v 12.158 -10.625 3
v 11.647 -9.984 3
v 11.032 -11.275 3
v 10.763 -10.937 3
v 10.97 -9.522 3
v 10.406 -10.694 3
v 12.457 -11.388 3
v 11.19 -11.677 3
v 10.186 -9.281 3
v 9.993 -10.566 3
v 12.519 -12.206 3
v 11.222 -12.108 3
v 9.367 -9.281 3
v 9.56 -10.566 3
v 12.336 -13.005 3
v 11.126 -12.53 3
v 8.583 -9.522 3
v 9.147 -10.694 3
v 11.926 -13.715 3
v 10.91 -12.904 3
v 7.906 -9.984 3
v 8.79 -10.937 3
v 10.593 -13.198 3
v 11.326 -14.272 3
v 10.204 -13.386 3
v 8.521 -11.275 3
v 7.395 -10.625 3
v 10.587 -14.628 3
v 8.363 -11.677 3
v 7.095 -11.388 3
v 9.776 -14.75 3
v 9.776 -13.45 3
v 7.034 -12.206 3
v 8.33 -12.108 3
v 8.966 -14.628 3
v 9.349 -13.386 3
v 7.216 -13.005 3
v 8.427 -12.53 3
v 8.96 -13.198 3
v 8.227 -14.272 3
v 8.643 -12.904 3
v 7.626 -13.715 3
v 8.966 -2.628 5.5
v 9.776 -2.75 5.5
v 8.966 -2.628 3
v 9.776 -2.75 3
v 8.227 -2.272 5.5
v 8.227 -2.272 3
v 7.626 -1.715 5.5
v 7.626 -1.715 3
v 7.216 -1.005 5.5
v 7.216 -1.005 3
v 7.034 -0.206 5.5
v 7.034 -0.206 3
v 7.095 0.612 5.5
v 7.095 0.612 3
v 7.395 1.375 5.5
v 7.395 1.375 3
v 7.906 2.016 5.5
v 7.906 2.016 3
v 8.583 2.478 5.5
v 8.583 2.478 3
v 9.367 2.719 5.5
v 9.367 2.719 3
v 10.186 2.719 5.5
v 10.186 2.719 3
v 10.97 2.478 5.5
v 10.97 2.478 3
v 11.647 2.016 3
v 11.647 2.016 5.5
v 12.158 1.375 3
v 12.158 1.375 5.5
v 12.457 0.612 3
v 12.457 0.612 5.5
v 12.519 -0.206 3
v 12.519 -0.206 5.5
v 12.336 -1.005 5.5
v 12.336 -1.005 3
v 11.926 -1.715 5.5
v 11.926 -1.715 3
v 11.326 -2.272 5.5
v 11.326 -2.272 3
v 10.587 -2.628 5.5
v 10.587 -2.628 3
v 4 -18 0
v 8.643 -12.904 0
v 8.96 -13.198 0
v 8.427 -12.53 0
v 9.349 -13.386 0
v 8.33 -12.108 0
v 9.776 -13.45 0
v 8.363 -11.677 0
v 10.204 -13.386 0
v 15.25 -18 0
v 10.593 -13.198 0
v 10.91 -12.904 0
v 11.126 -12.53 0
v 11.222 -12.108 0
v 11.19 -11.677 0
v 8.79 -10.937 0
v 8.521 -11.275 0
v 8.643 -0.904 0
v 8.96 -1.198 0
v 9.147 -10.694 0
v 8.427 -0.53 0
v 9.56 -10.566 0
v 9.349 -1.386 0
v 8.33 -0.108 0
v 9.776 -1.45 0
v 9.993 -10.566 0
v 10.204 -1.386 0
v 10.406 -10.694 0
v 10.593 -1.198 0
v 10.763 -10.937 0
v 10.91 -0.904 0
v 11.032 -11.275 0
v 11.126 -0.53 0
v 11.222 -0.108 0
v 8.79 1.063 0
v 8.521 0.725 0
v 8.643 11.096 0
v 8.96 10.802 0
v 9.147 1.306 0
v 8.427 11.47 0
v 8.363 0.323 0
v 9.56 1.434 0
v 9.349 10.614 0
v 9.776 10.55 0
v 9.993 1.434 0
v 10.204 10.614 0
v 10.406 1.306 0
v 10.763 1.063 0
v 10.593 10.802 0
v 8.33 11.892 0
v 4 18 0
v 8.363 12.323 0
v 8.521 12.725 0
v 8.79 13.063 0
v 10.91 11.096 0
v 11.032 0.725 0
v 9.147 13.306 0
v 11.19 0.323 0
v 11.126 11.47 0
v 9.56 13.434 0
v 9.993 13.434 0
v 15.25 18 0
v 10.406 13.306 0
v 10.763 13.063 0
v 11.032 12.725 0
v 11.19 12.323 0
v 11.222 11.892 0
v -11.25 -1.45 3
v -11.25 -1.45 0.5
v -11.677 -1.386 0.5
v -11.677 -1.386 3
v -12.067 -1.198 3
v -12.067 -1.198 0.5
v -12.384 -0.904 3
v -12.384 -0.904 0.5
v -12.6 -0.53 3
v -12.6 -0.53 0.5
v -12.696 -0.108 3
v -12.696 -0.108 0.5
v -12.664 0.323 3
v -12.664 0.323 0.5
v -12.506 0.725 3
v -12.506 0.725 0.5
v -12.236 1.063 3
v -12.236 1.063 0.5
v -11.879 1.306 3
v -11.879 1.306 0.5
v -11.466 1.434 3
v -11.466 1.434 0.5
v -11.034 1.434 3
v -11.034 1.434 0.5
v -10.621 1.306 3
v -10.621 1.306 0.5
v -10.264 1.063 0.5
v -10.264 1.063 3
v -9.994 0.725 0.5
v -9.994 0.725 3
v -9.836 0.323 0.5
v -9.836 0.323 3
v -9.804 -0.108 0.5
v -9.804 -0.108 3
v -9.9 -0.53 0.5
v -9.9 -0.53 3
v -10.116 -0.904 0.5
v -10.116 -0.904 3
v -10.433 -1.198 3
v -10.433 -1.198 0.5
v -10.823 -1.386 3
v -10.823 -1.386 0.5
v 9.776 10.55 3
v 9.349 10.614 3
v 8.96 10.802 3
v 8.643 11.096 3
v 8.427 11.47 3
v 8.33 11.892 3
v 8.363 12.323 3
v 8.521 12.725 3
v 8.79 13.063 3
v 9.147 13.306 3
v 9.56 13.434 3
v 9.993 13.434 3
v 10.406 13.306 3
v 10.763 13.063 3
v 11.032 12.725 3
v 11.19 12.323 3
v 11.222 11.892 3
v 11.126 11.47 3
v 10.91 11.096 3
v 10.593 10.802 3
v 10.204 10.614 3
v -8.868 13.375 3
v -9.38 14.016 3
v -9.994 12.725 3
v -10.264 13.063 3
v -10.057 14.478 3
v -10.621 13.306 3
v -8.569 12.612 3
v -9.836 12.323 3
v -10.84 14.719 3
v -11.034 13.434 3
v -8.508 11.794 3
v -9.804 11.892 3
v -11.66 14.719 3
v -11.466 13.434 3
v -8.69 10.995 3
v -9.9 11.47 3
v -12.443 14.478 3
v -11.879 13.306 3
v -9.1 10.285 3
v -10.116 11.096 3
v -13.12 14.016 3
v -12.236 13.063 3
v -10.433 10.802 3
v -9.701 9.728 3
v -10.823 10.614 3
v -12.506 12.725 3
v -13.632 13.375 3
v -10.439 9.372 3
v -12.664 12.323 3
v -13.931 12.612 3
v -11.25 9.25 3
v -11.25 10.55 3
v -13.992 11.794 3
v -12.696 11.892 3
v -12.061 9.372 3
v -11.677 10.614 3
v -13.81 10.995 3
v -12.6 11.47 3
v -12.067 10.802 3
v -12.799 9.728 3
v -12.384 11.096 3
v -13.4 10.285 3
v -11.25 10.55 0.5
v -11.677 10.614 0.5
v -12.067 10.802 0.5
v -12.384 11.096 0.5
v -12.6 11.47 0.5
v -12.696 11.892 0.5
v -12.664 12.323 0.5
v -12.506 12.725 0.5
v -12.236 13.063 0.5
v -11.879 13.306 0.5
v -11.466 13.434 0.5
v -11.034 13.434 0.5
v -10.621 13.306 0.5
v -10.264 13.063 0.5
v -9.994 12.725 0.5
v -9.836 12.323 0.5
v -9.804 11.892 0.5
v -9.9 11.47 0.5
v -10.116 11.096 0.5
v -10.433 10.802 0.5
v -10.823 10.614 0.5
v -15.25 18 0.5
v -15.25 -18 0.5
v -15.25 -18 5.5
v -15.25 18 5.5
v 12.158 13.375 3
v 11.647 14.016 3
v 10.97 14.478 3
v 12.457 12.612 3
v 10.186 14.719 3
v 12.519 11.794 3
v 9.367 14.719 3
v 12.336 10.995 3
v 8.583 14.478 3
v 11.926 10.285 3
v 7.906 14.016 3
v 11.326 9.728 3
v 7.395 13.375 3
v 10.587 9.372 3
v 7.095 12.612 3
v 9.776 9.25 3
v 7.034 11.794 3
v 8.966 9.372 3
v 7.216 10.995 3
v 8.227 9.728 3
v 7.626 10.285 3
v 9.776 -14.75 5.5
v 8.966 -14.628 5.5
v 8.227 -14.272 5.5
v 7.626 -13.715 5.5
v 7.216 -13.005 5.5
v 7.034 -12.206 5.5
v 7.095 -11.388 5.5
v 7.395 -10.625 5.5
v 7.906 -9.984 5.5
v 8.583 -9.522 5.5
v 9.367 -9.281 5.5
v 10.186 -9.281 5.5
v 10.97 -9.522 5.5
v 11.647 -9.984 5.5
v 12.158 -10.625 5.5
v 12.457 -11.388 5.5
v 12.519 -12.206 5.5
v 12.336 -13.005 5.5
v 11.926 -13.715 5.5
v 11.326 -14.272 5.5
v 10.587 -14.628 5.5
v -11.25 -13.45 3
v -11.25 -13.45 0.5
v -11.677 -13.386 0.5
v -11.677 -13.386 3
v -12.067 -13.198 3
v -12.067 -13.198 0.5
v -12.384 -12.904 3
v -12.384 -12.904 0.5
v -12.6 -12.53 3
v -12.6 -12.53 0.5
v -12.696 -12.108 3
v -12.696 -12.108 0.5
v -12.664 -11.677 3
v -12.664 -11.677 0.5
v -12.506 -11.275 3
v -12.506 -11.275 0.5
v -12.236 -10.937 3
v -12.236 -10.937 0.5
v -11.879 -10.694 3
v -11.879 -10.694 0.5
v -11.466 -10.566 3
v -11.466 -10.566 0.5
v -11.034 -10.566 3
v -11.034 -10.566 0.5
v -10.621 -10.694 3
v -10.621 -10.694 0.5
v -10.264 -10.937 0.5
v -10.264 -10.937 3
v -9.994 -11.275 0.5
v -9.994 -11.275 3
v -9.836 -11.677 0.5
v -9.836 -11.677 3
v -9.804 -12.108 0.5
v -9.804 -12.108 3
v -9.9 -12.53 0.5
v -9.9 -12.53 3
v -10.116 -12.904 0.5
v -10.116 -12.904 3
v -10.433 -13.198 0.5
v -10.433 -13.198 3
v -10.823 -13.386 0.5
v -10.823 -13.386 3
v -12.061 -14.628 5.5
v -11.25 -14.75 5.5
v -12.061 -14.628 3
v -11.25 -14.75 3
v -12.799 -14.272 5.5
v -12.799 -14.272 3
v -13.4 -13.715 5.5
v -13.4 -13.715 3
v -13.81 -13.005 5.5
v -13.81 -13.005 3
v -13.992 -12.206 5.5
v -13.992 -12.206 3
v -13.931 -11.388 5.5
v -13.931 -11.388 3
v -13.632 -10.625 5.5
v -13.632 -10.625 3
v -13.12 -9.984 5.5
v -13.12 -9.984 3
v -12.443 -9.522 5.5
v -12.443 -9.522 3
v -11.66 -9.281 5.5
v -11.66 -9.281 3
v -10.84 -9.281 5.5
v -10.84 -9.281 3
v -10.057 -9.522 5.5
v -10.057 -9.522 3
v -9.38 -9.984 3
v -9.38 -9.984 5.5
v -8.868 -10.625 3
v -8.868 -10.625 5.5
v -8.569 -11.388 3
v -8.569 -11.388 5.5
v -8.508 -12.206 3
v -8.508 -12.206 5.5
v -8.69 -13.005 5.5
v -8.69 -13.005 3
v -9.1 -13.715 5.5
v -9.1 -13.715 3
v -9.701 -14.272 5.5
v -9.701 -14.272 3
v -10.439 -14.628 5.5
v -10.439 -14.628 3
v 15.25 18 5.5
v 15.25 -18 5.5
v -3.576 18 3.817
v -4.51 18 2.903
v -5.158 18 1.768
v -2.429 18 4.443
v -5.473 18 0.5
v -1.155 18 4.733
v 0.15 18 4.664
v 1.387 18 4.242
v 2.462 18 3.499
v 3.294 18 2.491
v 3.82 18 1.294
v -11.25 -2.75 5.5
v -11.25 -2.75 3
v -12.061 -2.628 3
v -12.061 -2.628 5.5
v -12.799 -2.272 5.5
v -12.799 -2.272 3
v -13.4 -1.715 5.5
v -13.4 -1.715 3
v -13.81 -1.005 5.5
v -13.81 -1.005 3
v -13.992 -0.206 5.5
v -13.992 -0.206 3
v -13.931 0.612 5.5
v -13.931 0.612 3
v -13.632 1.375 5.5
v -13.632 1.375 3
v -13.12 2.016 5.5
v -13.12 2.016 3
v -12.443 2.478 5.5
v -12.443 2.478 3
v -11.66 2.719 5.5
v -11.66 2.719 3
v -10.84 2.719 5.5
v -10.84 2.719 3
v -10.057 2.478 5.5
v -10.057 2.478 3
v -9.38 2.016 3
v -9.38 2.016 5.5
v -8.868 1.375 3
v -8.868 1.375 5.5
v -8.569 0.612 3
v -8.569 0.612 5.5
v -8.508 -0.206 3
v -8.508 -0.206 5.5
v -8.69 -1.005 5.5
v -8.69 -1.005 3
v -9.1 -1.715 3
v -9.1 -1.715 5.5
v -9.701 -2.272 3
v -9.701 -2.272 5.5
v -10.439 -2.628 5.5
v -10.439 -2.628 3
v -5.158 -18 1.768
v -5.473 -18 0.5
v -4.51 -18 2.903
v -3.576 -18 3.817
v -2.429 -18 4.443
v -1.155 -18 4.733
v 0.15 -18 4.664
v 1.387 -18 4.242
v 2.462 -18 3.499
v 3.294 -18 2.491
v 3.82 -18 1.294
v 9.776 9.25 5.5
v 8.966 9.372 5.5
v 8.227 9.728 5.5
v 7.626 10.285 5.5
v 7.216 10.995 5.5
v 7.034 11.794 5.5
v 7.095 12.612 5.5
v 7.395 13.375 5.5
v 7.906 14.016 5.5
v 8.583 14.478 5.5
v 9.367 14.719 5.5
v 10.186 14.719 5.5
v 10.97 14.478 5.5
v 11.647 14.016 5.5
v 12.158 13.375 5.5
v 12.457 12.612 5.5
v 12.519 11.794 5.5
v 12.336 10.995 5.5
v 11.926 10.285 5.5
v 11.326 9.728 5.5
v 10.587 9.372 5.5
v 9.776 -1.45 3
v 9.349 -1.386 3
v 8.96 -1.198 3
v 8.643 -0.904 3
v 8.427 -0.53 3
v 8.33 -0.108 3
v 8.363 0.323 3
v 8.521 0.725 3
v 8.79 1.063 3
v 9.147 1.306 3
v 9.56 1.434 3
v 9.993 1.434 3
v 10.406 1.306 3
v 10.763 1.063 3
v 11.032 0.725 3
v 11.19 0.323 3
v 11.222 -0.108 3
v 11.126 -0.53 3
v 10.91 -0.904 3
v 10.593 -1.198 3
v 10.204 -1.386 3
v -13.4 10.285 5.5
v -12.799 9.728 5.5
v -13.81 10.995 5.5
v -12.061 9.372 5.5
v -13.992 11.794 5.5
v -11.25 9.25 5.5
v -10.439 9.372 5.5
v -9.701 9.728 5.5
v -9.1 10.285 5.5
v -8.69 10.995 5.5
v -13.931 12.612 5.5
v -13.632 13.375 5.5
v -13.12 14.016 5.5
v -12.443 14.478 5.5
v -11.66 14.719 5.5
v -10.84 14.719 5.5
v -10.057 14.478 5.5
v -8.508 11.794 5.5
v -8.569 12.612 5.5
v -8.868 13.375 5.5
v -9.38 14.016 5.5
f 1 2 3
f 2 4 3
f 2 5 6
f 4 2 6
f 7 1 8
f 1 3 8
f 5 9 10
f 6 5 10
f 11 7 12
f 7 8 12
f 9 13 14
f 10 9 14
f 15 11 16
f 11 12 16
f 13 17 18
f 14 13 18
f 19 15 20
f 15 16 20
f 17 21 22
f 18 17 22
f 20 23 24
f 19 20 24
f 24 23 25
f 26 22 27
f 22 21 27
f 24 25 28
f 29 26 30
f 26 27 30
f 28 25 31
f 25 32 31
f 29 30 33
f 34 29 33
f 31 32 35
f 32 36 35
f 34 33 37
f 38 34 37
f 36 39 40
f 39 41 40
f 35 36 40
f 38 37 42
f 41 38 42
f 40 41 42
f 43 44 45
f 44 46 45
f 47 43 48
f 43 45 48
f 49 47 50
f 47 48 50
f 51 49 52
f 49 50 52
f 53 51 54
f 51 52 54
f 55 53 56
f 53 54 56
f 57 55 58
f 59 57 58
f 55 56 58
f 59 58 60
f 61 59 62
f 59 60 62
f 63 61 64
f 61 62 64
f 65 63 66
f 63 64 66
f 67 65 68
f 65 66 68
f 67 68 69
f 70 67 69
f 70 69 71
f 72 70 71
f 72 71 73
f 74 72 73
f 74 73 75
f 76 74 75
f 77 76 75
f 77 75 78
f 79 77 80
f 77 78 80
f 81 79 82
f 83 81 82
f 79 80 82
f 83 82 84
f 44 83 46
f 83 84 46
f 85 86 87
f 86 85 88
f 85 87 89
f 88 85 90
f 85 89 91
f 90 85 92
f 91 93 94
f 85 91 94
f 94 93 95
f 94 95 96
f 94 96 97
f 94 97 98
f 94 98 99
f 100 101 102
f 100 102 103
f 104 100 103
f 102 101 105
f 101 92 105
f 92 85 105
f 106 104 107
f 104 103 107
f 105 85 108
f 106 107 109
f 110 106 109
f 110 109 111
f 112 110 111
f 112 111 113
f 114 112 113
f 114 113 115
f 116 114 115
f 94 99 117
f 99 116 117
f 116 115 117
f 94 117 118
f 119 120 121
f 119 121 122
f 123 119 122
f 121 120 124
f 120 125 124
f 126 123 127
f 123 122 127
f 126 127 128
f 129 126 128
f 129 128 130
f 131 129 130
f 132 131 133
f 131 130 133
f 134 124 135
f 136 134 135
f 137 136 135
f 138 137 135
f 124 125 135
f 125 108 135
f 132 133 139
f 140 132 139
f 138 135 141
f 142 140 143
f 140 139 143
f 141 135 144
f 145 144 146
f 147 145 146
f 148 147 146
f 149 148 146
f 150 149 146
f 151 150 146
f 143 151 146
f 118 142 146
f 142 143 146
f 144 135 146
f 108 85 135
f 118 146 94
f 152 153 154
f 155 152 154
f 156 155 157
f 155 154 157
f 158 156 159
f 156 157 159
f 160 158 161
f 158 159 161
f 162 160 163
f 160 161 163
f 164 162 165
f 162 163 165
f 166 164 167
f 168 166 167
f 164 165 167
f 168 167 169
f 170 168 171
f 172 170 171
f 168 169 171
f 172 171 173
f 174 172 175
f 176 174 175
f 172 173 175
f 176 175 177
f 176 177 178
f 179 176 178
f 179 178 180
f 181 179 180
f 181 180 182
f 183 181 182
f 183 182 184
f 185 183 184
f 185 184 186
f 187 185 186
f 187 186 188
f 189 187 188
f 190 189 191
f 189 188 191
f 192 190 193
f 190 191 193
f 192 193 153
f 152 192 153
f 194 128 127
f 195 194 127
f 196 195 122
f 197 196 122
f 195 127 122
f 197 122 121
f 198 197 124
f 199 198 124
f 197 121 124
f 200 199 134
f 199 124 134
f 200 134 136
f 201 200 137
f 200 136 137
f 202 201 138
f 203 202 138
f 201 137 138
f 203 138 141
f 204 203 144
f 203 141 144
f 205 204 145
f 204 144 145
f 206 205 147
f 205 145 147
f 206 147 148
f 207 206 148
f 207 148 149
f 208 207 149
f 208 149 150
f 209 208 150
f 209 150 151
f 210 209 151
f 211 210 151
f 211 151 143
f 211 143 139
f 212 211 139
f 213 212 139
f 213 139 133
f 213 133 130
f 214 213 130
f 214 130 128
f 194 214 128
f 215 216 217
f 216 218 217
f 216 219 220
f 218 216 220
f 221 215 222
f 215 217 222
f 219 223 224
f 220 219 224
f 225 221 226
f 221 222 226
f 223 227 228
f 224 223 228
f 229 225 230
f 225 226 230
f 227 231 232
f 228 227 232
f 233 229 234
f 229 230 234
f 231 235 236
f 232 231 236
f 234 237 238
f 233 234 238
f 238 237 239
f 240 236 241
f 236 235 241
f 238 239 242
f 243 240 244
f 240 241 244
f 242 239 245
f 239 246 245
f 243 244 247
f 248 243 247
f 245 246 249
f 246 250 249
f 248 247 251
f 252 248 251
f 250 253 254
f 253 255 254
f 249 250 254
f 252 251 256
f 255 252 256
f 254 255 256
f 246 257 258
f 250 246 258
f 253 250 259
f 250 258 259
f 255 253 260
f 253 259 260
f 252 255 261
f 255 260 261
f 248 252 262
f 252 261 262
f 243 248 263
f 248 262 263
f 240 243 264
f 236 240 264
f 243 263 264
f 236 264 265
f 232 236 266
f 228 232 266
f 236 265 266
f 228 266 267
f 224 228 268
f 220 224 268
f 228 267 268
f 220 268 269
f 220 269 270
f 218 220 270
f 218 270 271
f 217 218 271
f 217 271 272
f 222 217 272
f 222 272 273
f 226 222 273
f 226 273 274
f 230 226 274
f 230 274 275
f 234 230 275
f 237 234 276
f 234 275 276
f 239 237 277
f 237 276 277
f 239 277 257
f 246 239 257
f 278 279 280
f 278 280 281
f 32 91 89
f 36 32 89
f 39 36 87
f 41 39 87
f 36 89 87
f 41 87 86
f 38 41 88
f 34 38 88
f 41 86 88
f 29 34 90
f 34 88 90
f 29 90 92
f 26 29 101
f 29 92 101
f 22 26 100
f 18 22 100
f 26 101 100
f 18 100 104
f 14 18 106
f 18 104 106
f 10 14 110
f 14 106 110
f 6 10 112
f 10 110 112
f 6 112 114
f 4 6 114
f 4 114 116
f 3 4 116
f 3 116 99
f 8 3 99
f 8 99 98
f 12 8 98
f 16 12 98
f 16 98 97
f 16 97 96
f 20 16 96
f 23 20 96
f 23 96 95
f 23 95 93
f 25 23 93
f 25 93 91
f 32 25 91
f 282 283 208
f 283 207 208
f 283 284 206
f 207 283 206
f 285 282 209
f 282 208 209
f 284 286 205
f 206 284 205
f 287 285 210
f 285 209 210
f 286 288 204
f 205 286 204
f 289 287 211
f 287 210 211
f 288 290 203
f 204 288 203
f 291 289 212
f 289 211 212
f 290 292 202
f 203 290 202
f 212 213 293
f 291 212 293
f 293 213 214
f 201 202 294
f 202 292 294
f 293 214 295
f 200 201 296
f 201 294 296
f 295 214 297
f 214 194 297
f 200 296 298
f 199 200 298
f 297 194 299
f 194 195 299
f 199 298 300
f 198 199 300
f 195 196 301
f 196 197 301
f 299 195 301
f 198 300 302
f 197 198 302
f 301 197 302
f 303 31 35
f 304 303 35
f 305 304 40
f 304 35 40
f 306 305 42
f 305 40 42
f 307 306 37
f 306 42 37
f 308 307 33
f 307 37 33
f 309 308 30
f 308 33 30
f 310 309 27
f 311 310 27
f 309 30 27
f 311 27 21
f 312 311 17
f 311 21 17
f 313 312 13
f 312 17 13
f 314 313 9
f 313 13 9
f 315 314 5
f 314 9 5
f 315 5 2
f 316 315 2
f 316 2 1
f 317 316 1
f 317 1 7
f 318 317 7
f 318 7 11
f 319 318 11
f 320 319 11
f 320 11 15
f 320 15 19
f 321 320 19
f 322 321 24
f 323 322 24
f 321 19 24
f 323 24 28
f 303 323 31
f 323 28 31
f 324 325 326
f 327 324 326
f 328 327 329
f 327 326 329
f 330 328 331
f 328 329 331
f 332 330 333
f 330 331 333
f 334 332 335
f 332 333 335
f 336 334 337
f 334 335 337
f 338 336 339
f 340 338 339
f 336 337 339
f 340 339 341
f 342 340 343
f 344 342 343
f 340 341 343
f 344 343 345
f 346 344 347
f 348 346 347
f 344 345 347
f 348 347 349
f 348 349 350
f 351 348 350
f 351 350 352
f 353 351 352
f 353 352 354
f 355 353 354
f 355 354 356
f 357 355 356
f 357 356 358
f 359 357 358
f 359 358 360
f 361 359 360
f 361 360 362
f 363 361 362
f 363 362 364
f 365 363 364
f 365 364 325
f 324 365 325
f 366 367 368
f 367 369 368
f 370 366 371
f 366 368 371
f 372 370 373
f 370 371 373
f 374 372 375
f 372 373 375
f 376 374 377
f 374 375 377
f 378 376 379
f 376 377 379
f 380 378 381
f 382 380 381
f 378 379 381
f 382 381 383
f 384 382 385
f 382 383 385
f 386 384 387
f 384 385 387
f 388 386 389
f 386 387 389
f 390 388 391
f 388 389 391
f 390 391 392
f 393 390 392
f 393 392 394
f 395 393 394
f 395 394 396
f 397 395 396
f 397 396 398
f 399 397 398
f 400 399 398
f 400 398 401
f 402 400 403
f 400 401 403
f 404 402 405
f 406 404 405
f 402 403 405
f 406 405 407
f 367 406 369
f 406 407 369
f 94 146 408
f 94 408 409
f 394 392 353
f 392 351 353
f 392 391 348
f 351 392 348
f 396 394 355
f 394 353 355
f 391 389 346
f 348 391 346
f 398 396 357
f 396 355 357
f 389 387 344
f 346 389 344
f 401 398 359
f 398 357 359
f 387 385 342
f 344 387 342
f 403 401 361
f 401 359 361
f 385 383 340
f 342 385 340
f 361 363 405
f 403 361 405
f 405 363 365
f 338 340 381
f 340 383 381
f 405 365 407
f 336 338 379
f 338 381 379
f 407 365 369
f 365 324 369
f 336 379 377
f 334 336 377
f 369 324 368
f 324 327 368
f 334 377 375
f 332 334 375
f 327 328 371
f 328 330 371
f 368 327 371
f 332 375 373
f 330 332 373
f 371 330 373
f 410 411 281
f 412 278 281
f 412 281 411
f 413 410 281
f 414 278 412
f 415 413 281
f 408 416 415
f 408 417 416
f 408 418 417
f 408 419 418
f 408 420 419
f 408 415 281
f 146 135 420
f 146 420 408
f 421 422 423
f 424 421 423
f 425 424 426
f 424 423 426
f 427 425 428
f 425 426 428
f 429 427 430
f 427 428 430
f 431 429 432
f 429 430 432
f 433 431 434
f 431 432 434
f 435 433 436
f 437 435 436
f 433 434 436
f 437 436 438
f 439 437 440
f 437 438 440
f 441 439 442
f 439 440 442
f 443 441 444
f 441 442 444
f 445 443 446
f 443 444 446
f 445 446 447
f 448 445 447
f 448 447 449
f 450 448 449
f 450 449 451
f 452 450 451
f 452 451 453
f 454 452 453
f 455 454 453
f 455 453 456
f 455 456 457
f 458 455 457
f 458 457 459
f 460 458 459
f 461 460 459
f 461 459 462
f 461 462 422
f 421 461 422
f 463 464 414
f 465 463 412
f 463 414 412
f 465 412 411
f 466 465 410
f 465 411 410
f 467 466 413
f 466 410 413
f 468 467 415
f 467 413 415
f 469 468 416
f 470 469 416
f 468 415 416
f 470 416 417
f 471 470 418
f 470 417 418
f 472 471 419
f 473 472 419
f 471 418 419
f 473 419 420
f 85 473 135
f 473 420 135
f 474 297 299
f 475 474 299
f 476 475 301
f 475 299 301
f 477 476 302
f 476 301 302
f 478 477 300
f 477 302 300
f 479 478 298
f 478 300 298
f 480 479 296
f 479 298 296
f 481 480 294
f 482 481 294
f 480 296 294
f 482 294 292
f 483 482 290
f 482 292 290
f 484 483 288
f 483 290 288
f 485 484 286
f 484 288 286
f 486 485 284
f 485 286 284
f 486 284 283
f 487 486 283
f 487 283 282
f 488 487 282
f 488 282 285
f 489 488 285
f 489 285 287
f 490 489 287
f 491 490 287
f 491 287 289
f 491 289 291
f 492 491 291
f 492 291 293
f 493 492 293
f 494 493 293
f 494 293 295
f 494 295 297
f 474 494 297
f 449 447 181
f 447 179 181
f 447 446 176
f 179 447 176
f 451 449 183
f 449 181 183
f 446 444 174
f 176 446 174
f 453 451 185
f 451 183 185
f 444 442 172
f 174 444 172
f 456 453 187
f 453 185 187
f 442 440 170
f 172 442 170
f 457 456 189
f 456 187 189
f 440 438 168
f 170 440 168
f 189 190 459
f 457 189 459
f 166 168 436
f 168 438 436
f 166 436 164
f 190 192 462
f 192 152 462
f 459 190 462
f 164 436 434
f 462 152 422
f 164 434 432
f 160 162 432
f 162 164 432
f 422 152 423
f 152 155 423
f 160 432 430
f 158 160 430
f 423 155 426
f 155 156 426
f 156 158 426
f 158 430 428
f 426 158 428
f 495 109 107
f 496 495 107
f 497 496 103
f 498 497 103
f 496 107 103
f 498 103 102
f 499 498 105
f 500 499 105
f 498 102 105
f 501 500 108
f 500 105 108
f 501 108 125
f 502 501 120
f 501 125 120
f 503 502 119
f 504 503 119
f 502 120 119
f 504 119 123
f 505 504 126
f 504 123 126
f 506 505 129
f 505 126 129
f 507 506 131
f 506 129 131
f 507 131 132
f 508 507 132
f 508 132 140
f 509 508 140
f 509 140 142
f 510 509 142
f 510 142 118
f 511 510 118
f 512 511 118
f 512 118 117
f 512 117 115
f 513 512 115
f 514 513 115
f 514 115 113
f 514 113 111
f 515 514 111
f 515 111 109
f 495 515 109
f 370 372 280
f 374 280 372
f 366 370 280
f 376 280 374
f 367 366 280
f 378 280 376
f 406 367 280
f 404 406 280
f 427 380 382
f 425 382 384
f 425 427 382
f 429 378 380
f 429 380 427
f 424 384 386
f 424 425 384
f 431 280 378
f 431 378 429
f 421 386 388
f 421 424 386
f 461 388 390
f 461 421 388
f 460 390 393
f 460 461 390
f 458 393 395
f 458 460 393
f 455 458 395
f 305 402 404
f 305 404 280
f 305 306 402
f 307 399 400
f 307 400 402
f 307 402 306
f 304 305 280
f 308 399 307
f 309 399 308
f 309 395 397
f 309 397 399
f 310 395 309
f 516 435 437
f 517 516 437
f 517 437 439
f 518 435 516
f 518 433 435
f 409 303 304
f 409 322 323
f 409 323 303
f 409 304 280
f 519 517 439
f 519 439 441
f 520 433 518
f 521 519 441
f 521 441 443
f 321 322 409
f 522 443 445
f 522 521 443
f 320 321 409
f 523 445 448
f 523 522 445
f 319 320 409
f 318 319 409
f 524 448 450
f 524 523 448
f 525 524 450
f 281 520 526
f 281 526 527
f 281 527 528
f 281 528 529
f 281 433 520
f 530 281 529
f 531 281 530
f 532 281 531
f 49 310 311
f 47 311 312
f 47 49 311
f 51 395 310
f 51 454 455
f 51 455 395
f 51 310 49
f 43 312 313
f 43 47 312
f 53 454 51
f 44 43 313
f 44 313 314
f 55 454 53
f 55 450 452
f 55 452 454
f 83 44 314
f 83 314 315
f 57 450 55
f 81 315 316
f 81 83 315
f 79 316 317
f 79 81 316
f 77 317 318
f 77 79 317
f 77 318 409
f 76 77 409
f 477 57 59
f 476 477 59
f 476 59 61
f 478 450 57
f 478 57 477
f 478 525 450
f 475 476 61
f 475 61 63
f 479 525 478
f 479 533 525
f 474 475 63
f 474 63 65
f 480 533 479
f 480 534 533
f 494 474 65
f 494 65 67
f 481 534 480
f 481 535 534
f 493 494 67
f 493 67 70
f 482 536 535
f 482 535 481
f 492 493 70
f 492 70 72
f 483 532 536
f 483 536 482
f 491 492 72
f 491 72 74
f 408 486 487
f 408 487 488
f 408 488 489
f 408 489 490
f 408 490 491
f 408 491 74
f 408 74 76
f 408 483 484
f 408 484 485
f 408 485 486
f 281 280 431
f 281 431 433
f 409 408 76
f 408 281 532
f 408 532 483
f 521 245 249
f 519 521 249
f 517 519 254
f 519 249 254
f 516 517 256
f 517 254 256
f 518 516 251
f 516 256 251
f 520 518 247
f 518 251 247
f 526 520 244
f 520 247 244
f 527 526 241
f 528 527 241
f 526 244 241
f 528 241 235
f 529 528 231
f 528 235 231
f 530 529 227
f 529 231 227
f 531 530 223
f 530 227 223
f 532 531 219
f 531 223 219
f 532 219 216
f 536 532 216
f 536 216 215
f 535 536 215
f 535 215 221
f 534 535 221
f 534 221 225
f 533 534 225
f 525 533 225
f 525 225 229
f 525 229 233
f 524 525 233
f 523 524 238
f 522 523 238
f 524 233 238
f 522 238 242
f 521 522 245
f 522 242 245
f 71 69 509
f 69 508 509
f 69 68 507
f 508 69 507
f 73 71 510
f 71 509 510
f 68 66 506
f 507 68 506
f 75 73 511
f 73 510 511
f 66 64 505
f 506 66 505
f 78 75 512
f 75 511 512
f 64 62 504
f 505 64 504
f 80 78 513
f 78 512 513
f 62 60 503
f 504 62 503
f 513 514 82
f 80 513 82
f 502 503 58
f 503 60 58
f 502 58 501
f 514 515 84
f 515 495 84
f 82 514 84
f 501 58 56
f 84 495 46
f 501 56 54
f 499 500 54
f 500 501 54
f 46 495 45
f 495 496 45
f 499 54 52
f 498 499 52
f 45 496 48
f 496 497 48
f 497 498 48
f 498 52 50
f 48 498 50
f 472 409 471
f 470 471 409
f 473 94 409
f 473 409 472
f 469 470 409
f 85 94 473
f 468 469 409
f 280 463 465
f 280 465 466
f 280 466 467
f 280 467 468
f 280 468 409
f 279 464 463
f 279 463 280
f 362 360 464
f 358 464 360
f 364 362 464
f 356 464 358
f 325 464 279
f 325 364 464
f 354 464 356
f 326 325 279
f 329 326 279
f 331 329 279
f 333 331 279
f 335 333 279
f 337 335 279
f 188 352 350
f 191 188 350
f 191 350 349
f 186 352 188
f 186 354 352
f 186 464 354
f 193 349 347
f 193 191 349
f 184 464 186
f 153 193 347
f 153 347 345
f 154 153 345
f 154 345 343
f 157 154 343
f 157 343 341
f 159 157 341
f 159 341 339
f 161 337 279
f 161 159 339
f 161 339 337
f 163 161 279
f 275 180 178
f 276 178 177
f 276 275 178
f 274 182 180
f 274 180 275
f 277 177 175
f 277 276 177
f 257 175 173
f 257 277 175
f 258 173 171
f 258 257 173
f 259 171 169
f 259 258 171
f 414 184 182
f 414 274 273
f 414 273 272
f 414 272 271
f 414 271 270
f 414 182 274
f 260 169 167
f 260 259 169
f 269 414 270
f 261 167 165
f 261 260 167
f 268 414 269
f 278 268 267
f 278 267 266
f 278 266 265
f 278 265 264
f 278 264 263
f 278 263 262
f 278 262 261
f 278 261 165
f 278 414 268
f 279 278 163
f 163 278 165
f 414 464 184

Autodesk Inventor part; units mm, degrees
ref_plane "YZ Plane" through (0, 0, 0) normal (1, 0, 0) x (0, 1, 0)
ref_plane "XZ Plane" through (0, 0, 0) normal (0, 1, 0) x (-1, 0, 0)
ref_plane "XY Plane" through (0, 0, 0) normal (0, 0, 1) x (1, 0, 0)
sketch "Sketch1" plane through (0, 0, 0) normal (0, 0, 1) x (1, 0, 0)
  line L0 (-15.25, 18) -> (15.25, 18)
  line L1 (15.25, 18) -> (15.25, -18)
  line L2 (15.25, -18) -> (-15.25, -18)
  line L3 (-15.25, -18) -> (-15.25, 18)
  point P0 (0, 0)
  dimension "d0" = 30.5
  dimension "d1" = 36
  dimension "d2" = 18
  dimension "d3" = 15.25
extrude "Extrusion1" add sketch "Sketch1" along normal blind 5.5
sketch "Sketch2" plane through (-15.25, 18, 0) normal (0, 1, 0) x (1, 0, 0)
  line L0 (30.5, 0) -> (30.5, -8.35) projected
  line L1 (30.5, -8.35) -> (70.5, -8.35) projected
  line L2 (70.5, 11.65) -> (70.5, -8.35) projected
  line L3 (0, 11.65) -> (70.5, 11.65) projected
  line L4 (0, 11.65) -> (0, 0.5) projected
  line L5 (0, 0.5) -> (9.7766, 0.5) projected
  arc A0 (19.2498, 0) -> (9.7766, 0.5) centre (14.5, 0) ccw projected
  line L6 (19.2498, 0) -> (30.5, 0) projected
  circle A1 centre (40.5, 1.65) radius 0.847 projected
  circle A2 centre (62.5, 1.65) radius 0.847 projected
  circle A3 centre (54.5, 1.65) radius 4 projected
  circle A4 centre (14.5, 0) radius 4.7498
  point P0 (15.25, 0)
extrude "Extrusion2" cut sketch "Sketch2" against normal through all contours A4 A0
sketch "Sketch3" plane through (0, 0, 5.5) normal (0, 0, 1) x (1, 0, 0)
  circle A0 centre (-11.25, 12) radius 1.0065 projected
  circle A1 centre (-11.25, 0) radius 1.0065 projected
  circle A2 centre (-11.25, -12) radius 1.0065 projected
  circle A3 centre (9.7764, 12) radius 1.0065 projected
  circle A4 centre (9.7764, 0) radius 1.0065 projected
  circle A5 centre (9.7764, -12) radius 1.0065 projected
  point P0 (0, 0)
hole "CBore for M2.5 screw" at (-11.25, -12, 5.5) at (-11.25, 0, 5.5) at (-11.25, 12, 5.5) at (9.7764, -12, 5.5) at (9.7764, 0, 5.5) at (9.7764, 12, 5.5) direction (0, 0, -1) diameter 2.9 end through all counterbore diameter 5.5 counterbore depth 2.5 clearance for "Socket Head Cap Screw" size "M2.5" standard "Ansi Metric M Profile"
sketch "Sketch4" plane through (0, 0, 0) normal (0, 0, -1) x (-1, 0, 0)
  circle A0 centre (11.25, 0) radius 1.45 projected
  circle A1 centre (11.25, -12) radius 1.45 projected
  circle A2 centre (11.25, 12) radius 1.45 projected
  line L0 (5.4998, 18) -> (5.4998, -18) projected
  line L1 (5.4998, -18) -> (15.25, -18) projected
  line L2 (15.25, -18) -> (15.25, 18) projected
  line L3 (15.25, 18) -> (5.4998, 18) projected
  line L4 (15.25, -18) -> (4.4998, -18)
  line L5 (4.4998, -18) -> (4.4998, 18)
  line L6 (4.4998, 18) -> (15.25, 18)
  line L7 (15.25, 18) -> (15.25, -18)
  point P0 (0, 0)
  dimension "d17" = 1
extrude "Extrusion3" cut sketch "Sketch4" against normal blind 0.5
equation "\"d2\" = 0.5 * d1"
equation "\"d3\" = 0.5 * d0"
properties part number "J007580" material "ALUMINUM, 6061-T651"
